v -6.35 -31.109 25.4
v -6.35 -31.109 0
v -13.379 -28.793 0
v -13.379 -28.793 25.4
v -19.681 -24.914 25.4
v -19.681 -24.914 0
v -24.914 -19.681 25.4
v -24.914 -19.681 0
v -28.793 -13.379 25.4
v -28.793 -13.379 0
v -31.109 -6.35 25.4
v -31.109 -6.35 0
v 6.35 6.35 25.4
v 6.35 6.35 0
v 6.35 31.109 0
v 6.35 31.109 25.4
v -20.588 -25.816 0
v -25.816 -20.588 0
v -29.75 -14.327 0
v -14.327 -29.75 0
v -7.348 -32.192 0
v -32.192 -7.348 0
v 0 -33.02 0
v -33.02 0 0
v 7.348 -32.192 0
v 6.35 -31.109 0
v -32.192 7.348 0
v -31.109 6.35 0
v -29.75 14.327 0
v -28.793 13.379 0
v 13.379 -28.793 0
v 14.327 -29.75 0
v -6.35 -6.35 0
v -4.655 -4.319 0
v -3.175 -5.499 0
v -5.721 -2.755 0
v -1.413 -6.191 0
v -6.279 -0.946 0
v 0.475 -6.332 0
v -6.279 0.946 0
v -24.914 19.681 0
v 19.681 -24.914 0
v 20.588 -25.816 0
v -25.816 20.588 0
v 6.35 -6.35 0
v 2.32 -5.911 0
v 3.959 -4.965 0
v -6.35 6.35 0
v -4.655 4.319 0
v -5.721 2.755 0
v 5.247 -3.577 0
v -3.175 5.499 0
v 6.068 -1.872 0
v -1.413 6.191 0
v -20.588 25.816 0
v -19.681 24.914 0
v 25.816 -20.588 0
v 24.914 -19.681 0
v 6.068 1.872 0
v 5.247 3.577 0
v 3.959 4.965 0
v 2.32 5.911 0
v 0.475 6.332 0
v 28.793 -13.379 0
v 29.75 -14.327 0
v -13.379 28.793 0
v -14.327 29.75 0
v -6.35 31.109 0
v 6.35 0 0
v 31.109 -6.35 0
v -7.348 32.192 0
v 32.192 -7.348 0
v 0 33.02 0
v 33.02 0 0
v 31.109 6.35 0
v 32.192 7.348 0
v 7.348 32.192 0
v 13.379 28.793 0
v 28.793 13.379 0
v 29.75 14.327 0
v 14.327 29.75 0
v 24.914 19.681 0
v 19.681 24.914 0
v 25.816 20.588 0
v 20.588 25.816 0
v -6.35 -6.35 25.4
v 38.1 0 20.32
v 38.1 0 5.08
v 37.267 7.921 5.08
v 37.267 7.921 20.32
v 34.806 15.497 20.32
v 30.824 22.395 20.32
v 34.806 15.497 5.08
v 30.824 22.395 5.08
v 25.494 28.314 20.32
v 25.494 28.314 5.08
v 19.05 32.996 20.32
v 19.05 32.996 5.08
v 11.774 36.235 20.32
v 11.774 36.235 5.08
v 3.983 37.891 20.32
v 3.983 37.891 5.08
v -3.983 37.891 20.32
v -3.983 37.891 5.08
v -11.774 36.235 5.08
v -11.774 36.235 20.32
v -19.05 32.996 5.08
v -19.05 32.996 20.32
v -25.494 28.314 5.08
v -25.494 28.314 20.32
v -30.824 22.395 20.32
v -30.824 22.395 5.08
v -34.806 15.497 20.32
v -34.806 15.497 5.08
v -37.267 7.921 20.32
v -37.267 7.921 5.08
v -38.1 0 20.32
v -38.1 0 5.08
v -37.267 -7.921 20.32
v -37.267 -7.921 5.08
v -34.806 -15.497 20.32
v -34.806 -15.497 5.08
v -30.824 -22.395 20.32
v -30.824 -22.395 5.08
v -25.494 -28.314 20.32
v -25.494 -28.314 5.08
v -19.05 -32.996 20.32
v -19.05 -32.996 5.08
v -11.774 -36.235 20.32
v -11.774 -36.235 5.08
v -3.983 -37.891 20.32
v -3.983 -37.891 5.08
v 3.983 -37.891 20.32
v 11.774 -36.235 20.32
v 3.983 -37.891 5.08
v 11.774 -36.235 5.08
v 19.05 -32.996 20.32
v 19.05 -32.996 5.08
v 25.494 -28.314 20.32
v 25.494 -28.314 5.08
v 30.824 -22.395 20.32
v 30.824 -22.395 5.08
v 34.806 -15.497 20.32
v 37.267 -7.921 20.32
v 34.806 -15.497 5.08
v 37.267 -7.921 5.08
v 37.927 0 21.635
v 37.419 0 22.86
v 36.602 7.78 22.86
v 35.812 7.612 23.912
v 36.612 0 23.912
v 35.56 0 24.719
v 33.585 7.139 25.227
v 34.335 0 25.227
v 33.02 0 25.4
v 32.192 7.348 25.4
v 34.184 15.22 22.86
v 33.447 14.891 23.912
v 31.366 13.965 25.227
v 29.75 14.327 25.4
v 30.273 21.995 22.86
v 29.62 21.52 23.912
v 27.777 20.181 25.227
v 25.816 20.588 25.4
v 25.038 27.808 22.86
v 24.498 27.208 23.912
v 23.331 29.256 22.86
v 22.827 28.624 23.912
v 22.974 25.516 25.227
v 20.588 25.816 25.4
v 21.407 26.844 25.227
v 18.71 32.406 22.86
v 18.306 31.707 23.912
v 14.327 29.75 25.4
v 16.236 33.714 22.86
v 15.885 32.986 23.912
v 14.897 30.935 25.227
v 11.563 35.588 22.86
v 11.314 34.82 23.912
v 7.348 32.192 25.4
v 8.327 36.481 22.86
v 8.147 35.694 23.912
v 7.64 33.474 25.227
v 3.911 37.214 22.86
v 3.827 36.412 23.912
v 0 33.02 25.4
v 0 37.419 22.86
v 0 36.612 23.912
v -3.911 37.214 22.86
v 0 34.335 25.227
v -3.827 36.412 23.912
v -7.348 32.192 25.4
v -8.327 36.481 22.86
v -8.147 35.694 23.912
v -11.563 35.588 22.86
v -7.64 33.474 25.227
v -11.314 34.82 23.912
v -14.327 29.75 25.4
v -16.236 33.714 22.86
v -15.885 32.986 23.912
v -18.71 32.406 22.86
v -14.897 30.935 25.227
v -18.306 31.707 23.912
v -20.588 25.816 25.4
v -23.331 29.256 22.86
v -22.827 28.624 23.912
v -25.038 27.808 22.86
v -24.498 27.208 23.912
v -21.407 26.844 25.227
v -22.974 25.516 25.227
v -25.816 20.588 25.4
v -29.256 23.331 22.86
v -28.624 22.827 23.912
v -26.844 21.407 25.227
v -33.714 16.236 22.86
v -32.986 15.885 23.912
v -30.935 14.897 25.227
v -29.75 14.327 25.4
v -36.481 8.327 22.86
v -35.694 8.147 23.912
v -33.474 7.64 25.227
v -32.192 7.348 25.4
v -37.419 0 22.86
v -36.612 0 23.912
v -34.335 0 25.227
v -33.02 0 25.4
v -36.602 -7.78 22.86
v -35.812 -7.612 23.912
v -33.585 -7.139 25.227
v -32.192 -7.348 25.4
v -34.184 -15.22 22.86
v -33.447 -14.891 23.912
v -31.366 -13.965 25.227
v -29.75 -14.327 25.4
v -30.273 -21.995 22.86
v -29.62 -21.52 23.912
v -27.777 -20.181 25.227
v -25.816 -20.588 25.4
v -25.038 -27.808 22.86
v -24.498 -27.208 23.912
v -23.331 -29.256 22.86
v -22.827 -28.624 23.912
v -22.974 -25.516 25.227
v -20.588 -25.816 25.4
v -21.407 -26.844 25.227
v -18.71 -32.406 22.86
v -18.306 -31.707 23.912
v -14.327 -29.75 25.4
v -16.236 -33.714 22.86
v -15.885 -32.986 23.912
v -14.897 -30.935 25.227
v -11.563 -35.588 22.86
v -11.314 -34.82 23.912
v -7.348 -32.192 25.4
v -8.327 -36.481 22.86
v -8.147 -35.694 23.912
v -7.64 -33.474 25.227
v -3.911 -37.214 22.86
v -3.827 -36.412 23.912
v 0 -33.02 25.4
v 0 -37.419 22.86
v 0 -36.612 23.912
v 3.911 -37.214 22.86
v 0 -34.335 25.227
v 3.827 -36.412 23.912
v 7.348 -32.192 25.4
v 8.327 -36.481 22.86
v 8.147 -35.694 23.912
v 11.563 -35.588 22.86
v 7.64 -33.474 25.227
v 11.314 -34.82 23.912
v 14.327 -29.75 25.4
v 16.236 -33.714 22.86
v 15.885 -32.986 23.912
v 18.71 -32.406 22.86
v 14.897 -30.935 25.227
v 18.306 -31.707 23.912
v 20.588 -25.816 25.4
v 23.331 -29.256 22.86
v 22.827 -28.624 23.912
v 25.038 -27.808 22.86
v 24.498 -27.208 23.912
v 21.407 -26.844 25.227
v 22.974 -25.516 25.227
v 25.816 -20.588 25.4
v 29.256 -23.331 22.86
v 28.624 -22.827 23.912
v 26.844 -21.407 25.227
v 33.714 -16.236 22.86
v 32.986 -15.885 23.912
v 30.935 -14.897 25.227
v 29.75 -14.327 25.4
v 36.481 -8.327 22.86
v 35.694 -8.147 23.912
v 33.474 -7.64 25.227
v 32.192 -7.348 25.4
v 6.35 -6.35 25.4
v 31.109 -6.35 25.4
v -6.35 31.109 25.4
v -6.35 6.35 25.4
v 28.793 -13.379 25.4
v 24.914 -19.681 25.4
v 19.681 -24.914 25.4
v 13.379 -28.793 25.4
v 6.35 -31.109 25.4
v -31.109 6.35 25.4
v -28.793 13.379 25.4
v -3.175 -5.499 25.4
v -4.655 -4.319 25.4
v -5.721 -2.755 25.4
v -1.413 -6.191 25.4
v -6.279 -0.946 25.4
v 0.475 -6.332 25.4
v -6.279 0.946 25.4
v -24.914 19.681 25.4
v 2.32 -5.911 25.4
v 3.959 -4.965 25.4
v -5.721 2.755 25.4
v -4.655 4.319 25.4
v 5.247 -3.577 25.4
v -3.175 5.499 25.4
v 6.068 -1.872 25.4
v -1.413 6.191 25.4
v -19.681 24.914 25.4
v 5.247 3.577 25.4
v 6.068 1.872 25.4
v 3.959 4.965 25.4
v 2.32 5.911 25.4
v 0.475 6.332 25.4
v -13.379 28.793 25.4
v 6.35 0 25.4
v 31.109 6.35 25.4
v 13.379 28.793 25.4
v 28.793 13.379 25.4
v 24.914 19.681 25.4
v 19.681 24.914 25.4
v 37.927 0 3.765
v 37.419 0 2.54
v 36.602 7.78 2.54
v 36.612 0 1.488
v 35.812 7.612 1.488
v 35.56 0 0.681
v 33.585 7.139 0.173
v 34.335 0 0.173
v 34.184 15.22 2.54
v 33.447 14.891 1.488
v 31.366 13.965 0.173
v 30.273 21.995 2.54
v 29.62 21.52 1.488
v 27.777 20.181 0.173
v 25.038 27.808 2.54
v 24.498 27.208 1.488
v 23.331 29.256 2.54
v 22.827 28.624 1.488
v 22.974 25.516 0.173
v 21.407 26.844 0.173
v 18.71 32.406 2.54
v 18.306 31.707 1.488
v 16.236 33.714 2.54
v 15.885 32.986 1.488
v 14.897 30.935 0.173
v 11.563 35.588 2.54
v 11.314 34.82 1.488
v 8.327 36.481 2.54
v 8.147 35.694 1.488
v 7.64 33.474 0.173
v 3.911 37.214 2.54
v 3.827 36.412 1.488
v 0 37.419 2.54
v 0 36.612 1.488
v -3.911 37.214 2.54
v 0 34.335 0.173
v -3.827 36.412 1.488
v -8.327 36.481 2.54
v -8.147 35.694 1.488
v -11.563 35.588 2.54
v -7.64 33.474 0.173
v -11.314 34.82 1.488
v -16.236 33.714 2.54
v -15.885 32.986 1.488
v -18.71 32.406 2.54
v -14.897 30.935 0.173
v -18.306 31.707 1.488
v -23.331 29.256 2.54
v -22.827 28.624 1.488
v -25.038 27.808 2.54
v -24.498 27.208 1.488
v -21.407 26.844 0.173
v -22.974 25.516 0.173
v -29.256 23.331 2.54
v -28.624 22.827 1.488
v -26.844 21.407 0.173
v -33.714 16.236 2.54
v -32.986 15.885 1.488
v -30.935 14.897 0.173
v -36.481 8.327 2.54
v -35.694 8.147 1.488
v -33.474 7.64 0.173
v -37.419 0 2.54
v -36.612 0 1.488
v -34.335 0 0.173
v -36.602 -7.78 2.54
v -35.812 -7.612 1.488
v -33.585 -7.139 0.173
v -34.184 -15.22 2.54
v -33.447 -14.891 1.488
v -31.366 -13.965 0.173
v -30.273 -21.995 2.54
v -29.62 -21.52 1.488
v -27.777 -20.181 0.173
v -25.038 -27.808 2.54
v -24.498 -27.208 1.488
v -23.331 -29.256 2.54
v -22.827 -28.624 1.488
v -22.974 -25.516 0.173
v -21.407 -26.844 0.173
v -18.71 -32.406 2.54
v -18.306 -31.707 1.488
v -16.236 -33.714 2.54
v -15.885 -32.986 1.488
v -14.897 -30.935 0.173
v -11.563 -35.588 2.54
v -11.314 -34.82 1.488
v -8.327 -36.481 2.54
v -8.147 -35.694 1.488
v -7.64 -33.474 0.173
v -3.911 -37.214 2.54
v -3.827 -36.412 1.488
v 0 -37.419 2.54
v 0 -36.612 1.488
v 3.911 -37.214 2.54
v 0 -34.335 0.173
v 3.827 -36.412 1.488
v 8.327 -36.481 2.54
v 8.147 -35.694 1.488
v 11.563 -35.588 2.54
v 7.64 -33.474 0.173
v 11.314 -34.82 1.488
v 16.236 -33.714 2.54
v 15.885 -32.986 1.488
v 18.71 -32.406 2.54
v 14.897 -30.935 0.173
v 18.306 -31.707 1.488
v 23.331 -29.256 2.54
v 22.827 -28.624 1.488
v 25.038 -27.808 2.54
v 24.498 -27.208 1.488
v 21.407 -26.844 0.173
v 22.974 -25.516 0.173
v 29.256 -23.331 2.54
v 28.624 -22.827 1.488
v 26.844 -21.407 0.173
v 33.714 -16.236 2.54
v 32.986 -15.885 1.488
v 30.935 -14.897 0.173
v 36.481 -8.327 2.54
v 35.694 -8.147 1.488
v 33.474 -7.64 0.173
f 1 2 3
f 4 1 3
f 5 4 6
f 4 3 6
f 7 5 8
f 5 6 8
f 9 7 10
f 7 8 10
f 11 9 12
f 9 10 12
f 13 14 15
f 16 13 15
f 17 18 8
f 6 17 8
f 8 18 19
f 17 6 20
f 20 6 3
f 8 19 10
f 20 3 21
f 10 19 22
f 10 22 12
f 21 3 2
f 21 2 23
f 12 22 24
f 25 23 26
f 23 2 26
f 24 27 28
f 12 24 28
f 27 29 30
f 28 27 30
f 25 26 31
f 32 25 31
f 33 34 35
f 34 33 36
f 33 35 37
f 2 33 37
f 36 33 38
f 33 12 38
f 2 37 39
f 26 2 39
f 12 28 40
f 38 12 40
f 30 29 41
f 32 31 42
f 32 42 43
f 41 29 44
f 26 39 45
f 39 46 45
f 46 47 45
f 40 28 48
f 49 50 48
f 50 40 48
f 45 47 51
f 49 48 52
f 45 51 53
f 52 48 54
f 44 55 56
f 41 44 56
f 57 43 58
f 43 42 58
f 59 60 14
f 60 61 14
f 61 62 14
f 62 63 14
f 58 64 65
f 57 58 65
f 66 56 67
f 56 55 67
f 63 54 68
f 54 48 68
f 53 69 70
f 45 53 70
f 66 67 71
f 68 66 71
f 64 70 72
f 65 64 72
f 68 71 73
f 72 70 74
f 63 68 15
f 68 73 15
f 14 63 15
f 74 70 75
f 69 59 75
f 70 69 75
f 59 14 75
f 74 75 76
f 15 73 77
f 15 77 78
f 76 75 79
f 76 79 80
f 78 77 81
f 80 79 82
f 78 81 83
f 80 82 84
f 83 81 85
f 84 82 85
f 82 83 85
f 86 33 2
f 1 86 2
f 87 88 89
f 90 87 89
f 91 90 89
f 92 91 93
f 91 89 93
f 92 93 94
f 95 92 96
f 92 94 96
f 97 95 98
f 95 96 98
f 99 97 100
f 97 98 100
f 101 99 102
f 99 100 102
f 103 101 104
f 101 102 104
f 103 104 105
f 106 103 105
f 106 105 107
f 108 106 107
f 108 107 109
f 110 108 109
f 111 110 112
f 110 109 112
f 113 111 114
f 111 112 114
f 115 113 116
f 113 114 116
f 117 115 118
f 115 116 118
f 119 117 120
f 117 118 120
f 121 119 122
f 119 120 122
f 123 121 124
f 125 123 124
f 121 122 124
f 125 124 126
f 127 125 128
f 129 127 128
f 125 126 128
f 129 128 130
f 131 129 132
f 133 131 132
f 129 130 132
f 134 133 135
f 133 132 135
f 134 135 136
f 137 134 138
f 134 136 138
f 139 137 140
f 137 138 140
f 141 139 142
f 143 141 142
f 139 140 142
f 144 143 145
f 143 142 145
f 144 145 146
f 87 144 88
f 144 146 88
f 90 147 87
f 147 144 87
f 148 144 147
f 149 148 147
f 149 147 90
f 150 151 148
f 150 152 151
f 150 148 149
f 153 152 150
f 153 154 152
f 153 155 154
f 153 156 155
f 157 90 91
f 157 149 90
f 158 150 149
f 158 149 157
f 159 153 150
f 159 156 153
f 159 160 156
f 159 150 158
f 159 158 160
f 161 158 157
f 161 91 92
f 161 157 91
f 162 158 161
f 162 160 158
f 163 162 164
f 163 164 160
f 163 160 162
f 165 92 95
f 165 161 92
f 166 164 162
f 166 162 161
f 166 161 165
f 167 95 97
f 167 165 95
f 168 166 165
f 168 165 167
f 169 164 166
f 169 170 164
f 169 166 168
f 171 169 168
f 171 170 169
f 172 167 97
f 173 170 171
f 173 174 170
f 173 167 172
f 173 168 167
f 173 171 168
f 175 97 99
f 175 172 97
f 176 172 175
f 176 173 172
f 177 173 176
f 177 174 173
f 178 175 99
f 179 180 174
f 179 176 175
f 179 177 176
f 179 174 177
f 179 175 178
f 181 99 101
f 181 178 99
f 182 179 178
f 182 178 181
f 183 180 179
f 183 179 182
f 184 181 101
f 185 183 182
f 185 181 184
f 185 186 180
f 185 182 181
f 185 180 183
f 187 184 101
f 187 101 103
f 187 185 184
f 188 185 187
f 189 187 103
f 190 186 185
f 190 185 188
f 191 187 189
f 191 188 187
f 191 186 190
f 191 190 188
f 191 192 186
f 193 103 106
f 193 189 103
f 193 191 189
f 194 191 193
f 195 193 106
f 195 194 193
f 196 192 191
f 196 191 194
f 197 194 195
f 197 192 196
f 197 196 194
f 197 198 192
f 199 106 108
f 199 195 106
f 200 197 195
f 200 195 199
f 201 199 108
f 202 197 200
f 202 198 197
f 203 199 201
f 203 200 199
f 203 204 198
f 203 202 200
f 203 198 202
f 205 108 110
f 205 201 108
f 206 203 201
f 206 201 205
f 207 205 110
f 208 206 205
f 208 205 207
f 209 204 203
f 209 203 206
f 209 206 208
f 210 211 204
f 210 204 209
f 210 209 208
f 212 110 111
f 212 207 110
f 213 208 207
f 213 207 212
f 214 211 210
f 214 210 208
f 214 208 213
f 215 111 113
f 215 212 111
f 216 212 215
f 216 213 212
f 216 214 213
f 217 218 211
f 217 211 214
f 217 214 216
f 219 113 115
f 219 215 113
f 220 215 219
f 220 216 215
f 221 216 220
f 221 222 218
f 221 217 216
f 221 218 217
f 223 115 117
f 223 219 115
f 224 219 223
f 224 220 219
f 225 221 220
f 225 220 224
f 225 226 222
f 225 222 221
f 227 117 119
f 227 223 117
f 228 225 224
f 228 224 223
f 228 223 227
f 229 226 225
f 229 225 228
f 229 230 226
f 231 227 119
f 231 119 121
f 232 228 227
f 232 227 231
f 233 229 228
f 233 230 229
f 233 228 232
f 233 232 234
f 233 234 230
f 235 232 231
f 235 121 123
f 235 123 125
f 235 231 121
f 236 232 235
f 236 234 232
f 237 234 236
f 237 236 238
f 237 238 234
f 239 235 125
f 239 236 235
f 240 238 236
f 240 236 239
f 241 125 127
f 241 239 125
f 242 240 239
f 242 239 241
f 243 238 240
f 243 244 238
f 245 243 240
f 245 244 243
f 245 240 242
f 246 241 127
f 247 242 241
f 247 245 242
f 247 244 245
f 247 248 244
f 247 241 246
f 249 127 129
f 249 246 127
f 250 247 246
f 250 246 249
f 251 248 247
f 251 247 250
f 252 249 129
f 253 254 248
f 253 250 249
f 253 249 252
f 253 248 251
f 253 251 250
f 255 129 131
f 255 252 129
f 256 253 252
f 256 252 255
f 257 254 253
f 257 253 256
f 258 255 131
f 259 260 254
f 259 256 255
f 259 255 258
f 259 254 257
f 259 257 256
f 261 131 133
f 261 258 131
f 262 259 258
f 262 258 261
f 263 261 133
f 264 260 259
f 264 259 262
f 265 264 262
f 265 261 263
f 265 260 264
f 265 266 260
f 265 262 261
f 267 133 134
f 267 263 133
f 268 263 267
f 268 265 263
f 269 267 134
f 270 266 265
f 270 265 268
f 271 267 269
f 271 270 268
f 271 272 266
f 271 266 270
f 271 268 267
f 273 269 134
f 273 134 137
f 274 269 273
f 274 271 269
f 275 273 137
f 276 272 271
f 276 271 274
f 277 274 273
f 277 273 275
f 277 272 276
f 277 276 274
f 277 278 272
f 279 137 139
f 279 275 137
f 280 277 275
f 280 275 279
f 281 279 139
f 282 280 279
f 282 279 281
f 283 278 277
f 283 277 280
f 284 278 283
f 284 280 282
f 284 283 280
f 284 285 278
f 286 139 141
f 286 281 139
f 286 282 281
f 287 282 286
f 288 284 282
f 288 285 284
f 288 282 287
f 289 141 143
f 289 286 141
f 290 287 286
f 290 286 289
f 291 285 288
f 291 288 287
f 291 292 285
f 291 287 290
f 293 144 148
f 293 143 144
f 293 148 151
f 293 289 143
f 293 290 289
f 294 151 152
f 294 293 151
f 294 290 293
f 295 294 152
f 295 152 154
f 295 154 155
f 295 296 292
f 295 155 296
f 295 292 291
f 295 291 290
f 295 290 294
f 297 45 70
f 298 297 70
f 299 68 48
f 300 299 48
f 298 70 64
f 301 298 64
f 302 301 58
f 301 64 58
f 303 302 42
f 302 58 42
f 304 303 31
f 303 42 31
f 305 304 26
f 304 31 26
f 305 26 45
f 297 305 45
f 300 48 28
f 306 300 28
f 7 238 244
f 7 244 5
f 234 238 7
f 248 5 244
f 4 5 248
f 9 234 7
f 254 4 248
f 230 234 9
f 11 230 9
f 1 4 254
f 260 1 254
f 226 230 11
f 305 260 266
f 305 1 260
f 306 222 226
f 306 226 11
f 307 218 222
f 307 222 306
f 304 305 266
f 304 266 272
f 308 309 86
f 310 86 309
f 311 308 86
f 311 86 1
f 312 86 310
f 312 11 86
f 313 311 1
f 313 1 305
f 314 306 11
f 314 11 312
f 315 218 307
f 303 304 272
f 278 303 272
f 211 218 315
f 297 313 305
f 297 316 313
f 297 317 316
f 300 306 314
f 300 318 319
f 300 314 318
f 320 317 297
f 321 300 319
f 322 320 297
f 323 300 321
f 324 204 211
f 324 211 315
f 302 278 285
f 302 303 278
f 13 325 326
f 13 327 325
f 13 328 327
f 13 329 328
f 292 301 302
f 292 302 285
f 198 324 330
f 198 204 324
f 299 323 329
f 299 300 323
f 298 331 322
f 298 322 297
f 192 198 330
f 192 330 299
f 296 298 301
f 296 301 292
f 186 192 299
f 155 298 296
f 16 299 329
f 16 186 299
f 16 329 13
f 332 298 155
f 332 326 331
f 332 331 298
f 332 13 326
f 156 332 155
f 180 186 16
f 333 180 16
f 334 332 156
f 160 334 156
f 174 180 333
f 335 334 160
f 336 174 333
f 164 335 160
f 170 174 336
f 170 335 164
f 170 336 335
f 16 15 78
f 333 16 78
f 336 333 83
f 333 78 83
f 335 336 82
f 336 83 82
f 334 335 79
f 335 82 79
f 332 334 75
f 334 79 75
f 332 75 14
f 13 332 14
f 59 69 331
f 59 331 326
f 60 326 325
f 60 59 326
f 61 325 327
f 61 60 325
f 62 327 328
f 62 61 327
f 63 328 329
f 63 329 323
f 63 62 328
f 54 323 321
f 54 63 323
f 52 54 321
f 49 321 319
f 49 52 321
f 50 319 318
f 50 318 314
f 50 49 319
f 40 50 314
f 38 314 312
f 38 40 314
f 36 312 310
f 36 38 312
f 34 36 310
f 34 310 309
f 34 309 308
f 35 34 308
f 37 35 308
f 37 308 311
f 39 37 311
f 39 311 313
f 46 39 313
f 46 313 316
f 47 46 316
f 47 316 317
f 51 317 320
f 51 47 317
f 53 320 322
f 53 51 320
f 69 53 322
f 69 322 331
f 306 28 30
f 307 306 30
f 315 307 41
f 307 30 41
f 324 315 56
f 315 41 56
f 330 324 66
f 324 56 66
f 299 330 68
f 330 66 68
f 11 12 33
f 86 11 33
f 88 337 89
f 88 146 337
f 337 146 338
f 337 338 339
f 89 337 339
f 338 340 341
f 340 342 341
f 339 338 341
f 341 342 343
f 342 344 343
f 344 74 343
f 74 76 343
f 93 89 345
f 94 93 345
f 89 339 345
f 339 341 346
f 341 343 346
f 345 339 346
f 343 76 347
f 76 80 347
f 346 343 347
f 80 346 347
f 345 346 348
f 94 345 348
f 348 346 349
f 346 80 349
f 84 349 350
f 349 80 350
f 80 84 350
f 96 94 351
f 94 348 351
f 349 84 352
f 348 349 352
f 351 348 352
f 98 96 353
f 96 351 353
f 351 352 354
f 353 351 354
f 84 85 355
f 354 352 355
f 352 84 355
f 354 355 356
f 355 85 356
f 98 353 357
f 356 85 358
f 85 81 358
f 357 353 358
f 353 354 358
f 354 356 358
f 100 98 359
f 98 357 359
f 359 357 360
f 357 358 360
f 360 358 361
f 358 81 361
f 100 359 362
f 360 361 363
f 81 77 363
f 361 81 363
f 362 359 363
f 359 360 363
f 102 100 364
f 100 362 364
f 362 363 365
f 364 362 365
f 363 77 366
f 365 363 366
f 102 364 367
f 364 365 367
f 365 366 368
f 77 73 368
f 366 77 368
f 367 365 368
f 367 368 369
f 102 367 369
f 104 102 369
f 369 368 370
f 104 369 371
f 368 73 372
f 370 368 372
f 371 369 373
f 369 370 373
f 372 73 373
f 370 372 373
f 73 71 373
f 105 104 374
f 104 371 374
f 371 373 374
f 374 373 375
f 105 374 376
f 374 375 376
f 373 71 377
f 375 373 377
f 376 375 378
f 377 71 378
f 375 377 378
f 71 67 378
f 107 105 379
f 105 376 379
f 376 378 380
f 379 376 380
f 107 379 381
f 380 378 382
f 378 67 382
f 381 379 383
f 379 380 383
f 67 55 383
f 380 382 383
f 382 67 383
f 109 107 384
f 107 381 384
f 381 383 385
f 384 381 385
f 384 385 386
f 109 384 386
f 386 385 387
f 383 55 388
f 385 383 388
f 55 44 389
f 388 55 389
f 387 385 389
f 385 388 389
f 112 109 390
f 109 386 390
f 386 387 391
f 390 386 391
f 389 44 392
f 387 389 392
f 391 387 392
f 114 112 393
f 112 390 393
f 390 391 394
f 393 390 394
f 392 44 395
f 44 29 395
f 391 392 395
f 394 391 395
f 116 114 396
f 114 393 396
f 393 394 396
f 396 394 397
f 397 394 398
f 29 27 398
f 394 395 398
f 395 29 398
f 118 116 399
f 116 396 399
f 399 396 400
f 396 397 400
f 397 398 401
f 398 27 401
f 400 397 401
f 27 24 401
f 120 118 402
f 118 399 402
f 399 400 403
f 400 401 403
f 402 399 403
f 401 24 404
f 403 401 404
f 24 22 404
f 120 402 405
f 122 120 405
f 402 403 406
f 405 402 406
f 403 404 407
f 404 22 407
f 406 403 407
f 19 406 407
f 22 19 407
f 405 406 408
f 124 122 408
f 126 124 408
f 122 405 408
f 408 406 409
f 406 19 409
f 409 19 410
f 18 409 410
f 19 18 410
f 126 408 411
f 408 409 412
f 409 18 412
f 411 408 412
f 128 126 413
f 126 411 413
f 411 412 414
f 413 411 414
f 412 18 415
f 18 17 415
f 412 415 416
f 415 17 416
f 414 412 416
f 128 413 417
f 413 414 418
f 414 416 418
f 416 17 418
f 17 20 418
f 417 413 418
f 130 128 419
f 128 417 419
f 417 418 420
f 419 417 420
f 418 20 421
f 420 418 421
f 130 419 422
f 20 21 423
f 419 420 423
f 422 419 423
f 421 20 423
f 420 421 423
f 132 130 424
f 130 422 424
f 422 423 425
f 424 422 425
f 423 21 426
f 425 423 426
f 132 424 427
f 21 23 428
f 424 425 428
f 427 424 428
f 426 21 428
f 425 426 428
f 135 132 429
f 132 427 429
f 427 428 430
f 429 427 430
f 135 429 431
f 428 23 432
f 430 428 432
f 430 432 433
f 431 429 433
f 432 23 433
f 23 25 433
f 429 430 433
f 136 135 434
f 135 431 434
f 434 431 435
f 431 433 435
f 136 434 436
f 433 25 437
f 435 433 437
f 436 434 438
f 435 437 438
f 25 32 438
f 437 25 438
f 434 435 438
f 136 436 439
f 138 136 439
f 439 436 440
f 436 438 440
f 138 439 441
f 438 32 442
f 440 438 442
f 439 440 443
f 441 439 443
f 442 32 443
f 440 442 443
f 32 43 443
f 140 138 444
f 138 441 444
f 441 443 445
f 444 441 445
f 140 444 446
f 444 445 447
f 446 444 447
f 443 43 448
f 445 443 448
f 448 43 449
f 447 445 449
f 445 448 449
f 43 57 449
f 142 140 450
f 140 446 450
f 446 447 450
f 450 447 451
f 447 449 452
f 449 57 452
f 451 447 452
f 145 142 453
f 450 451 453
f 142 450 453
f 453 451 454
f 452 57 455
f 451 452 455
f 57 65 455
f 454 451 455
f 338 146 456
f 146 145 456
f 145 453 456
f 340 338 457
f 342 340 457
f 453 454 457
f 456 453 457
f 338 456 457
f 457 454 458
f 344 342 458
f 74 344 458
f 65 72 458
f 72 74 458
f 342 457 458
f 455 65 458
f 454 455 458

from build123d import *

# Parameters (mm, degrees)
F0_R     = 38.1
F0_R_2   = 6.35
F1_DEPTH = 25.4
F2_R     = 5.08


with BuildPart() as f1:
    # F0 (on Top) → F1 (new body)
    with BuildSketch(Plane.XY):
        Circle(F0_R)
        with BuildLine():
            Line((-31.10852, -6.35), (-6.35, -6.35))
            Line((-6.35, -6.35), (-6.35, -31.10852))
            ThreePointArc((-6.35, -31.10852), (-22.45064, -22.45064), (-31.10852, -6.35))
        make_face(mode=Mode.SUBTRACT)
        with BuildLine():
            Line((6.35, -31.10852), (6.35, -6.35))
            Line((6.35, -6.35), (31.10852, -6.35))
            ThreePointArc((31.10852, -6.35), (22.45064, -22.45064), (6.35, -31.10852))
        make_face(mode=Mode.SUBTRACT)
        with BuildLine():
            Line((-6.35, 31.10852), (-6.35, 6.35))
            Line((-6.35, 6.35), (-31.10852, 6.35))
            ThreePointArc((-31.10852, 6.35), (-22.45064, 22.45064), (-6.35, 31.10852))
        make_face(mode=Mode.SUBTRACT)
        Circle(F0_R_2, mode=Mode.SUBTRACT)
        with BuildLine():
            ThreePointArc((6.35, 31.10852), (22.45064, 22.45064), (31.10852, 6.35))
            Line((31.10852, 6.35), (6.35, 6.35))
            Line((6.35, 6.35), (6.35, 31.10852))
        make_face(mode=Mode.SUBTRACT)
    extrude(amount=F1_DEPTH)

    # F2
    f2_edges = [f1.edges().sort_by_distance(p)[0] for p in [
        (38.1, 0, 12.7),
        (-38.1, 0, 0),
        (-38.1, 0, 25.4),
    ]]
    fillet(f2_edges, radius=F2_R)


solid = f1.part
